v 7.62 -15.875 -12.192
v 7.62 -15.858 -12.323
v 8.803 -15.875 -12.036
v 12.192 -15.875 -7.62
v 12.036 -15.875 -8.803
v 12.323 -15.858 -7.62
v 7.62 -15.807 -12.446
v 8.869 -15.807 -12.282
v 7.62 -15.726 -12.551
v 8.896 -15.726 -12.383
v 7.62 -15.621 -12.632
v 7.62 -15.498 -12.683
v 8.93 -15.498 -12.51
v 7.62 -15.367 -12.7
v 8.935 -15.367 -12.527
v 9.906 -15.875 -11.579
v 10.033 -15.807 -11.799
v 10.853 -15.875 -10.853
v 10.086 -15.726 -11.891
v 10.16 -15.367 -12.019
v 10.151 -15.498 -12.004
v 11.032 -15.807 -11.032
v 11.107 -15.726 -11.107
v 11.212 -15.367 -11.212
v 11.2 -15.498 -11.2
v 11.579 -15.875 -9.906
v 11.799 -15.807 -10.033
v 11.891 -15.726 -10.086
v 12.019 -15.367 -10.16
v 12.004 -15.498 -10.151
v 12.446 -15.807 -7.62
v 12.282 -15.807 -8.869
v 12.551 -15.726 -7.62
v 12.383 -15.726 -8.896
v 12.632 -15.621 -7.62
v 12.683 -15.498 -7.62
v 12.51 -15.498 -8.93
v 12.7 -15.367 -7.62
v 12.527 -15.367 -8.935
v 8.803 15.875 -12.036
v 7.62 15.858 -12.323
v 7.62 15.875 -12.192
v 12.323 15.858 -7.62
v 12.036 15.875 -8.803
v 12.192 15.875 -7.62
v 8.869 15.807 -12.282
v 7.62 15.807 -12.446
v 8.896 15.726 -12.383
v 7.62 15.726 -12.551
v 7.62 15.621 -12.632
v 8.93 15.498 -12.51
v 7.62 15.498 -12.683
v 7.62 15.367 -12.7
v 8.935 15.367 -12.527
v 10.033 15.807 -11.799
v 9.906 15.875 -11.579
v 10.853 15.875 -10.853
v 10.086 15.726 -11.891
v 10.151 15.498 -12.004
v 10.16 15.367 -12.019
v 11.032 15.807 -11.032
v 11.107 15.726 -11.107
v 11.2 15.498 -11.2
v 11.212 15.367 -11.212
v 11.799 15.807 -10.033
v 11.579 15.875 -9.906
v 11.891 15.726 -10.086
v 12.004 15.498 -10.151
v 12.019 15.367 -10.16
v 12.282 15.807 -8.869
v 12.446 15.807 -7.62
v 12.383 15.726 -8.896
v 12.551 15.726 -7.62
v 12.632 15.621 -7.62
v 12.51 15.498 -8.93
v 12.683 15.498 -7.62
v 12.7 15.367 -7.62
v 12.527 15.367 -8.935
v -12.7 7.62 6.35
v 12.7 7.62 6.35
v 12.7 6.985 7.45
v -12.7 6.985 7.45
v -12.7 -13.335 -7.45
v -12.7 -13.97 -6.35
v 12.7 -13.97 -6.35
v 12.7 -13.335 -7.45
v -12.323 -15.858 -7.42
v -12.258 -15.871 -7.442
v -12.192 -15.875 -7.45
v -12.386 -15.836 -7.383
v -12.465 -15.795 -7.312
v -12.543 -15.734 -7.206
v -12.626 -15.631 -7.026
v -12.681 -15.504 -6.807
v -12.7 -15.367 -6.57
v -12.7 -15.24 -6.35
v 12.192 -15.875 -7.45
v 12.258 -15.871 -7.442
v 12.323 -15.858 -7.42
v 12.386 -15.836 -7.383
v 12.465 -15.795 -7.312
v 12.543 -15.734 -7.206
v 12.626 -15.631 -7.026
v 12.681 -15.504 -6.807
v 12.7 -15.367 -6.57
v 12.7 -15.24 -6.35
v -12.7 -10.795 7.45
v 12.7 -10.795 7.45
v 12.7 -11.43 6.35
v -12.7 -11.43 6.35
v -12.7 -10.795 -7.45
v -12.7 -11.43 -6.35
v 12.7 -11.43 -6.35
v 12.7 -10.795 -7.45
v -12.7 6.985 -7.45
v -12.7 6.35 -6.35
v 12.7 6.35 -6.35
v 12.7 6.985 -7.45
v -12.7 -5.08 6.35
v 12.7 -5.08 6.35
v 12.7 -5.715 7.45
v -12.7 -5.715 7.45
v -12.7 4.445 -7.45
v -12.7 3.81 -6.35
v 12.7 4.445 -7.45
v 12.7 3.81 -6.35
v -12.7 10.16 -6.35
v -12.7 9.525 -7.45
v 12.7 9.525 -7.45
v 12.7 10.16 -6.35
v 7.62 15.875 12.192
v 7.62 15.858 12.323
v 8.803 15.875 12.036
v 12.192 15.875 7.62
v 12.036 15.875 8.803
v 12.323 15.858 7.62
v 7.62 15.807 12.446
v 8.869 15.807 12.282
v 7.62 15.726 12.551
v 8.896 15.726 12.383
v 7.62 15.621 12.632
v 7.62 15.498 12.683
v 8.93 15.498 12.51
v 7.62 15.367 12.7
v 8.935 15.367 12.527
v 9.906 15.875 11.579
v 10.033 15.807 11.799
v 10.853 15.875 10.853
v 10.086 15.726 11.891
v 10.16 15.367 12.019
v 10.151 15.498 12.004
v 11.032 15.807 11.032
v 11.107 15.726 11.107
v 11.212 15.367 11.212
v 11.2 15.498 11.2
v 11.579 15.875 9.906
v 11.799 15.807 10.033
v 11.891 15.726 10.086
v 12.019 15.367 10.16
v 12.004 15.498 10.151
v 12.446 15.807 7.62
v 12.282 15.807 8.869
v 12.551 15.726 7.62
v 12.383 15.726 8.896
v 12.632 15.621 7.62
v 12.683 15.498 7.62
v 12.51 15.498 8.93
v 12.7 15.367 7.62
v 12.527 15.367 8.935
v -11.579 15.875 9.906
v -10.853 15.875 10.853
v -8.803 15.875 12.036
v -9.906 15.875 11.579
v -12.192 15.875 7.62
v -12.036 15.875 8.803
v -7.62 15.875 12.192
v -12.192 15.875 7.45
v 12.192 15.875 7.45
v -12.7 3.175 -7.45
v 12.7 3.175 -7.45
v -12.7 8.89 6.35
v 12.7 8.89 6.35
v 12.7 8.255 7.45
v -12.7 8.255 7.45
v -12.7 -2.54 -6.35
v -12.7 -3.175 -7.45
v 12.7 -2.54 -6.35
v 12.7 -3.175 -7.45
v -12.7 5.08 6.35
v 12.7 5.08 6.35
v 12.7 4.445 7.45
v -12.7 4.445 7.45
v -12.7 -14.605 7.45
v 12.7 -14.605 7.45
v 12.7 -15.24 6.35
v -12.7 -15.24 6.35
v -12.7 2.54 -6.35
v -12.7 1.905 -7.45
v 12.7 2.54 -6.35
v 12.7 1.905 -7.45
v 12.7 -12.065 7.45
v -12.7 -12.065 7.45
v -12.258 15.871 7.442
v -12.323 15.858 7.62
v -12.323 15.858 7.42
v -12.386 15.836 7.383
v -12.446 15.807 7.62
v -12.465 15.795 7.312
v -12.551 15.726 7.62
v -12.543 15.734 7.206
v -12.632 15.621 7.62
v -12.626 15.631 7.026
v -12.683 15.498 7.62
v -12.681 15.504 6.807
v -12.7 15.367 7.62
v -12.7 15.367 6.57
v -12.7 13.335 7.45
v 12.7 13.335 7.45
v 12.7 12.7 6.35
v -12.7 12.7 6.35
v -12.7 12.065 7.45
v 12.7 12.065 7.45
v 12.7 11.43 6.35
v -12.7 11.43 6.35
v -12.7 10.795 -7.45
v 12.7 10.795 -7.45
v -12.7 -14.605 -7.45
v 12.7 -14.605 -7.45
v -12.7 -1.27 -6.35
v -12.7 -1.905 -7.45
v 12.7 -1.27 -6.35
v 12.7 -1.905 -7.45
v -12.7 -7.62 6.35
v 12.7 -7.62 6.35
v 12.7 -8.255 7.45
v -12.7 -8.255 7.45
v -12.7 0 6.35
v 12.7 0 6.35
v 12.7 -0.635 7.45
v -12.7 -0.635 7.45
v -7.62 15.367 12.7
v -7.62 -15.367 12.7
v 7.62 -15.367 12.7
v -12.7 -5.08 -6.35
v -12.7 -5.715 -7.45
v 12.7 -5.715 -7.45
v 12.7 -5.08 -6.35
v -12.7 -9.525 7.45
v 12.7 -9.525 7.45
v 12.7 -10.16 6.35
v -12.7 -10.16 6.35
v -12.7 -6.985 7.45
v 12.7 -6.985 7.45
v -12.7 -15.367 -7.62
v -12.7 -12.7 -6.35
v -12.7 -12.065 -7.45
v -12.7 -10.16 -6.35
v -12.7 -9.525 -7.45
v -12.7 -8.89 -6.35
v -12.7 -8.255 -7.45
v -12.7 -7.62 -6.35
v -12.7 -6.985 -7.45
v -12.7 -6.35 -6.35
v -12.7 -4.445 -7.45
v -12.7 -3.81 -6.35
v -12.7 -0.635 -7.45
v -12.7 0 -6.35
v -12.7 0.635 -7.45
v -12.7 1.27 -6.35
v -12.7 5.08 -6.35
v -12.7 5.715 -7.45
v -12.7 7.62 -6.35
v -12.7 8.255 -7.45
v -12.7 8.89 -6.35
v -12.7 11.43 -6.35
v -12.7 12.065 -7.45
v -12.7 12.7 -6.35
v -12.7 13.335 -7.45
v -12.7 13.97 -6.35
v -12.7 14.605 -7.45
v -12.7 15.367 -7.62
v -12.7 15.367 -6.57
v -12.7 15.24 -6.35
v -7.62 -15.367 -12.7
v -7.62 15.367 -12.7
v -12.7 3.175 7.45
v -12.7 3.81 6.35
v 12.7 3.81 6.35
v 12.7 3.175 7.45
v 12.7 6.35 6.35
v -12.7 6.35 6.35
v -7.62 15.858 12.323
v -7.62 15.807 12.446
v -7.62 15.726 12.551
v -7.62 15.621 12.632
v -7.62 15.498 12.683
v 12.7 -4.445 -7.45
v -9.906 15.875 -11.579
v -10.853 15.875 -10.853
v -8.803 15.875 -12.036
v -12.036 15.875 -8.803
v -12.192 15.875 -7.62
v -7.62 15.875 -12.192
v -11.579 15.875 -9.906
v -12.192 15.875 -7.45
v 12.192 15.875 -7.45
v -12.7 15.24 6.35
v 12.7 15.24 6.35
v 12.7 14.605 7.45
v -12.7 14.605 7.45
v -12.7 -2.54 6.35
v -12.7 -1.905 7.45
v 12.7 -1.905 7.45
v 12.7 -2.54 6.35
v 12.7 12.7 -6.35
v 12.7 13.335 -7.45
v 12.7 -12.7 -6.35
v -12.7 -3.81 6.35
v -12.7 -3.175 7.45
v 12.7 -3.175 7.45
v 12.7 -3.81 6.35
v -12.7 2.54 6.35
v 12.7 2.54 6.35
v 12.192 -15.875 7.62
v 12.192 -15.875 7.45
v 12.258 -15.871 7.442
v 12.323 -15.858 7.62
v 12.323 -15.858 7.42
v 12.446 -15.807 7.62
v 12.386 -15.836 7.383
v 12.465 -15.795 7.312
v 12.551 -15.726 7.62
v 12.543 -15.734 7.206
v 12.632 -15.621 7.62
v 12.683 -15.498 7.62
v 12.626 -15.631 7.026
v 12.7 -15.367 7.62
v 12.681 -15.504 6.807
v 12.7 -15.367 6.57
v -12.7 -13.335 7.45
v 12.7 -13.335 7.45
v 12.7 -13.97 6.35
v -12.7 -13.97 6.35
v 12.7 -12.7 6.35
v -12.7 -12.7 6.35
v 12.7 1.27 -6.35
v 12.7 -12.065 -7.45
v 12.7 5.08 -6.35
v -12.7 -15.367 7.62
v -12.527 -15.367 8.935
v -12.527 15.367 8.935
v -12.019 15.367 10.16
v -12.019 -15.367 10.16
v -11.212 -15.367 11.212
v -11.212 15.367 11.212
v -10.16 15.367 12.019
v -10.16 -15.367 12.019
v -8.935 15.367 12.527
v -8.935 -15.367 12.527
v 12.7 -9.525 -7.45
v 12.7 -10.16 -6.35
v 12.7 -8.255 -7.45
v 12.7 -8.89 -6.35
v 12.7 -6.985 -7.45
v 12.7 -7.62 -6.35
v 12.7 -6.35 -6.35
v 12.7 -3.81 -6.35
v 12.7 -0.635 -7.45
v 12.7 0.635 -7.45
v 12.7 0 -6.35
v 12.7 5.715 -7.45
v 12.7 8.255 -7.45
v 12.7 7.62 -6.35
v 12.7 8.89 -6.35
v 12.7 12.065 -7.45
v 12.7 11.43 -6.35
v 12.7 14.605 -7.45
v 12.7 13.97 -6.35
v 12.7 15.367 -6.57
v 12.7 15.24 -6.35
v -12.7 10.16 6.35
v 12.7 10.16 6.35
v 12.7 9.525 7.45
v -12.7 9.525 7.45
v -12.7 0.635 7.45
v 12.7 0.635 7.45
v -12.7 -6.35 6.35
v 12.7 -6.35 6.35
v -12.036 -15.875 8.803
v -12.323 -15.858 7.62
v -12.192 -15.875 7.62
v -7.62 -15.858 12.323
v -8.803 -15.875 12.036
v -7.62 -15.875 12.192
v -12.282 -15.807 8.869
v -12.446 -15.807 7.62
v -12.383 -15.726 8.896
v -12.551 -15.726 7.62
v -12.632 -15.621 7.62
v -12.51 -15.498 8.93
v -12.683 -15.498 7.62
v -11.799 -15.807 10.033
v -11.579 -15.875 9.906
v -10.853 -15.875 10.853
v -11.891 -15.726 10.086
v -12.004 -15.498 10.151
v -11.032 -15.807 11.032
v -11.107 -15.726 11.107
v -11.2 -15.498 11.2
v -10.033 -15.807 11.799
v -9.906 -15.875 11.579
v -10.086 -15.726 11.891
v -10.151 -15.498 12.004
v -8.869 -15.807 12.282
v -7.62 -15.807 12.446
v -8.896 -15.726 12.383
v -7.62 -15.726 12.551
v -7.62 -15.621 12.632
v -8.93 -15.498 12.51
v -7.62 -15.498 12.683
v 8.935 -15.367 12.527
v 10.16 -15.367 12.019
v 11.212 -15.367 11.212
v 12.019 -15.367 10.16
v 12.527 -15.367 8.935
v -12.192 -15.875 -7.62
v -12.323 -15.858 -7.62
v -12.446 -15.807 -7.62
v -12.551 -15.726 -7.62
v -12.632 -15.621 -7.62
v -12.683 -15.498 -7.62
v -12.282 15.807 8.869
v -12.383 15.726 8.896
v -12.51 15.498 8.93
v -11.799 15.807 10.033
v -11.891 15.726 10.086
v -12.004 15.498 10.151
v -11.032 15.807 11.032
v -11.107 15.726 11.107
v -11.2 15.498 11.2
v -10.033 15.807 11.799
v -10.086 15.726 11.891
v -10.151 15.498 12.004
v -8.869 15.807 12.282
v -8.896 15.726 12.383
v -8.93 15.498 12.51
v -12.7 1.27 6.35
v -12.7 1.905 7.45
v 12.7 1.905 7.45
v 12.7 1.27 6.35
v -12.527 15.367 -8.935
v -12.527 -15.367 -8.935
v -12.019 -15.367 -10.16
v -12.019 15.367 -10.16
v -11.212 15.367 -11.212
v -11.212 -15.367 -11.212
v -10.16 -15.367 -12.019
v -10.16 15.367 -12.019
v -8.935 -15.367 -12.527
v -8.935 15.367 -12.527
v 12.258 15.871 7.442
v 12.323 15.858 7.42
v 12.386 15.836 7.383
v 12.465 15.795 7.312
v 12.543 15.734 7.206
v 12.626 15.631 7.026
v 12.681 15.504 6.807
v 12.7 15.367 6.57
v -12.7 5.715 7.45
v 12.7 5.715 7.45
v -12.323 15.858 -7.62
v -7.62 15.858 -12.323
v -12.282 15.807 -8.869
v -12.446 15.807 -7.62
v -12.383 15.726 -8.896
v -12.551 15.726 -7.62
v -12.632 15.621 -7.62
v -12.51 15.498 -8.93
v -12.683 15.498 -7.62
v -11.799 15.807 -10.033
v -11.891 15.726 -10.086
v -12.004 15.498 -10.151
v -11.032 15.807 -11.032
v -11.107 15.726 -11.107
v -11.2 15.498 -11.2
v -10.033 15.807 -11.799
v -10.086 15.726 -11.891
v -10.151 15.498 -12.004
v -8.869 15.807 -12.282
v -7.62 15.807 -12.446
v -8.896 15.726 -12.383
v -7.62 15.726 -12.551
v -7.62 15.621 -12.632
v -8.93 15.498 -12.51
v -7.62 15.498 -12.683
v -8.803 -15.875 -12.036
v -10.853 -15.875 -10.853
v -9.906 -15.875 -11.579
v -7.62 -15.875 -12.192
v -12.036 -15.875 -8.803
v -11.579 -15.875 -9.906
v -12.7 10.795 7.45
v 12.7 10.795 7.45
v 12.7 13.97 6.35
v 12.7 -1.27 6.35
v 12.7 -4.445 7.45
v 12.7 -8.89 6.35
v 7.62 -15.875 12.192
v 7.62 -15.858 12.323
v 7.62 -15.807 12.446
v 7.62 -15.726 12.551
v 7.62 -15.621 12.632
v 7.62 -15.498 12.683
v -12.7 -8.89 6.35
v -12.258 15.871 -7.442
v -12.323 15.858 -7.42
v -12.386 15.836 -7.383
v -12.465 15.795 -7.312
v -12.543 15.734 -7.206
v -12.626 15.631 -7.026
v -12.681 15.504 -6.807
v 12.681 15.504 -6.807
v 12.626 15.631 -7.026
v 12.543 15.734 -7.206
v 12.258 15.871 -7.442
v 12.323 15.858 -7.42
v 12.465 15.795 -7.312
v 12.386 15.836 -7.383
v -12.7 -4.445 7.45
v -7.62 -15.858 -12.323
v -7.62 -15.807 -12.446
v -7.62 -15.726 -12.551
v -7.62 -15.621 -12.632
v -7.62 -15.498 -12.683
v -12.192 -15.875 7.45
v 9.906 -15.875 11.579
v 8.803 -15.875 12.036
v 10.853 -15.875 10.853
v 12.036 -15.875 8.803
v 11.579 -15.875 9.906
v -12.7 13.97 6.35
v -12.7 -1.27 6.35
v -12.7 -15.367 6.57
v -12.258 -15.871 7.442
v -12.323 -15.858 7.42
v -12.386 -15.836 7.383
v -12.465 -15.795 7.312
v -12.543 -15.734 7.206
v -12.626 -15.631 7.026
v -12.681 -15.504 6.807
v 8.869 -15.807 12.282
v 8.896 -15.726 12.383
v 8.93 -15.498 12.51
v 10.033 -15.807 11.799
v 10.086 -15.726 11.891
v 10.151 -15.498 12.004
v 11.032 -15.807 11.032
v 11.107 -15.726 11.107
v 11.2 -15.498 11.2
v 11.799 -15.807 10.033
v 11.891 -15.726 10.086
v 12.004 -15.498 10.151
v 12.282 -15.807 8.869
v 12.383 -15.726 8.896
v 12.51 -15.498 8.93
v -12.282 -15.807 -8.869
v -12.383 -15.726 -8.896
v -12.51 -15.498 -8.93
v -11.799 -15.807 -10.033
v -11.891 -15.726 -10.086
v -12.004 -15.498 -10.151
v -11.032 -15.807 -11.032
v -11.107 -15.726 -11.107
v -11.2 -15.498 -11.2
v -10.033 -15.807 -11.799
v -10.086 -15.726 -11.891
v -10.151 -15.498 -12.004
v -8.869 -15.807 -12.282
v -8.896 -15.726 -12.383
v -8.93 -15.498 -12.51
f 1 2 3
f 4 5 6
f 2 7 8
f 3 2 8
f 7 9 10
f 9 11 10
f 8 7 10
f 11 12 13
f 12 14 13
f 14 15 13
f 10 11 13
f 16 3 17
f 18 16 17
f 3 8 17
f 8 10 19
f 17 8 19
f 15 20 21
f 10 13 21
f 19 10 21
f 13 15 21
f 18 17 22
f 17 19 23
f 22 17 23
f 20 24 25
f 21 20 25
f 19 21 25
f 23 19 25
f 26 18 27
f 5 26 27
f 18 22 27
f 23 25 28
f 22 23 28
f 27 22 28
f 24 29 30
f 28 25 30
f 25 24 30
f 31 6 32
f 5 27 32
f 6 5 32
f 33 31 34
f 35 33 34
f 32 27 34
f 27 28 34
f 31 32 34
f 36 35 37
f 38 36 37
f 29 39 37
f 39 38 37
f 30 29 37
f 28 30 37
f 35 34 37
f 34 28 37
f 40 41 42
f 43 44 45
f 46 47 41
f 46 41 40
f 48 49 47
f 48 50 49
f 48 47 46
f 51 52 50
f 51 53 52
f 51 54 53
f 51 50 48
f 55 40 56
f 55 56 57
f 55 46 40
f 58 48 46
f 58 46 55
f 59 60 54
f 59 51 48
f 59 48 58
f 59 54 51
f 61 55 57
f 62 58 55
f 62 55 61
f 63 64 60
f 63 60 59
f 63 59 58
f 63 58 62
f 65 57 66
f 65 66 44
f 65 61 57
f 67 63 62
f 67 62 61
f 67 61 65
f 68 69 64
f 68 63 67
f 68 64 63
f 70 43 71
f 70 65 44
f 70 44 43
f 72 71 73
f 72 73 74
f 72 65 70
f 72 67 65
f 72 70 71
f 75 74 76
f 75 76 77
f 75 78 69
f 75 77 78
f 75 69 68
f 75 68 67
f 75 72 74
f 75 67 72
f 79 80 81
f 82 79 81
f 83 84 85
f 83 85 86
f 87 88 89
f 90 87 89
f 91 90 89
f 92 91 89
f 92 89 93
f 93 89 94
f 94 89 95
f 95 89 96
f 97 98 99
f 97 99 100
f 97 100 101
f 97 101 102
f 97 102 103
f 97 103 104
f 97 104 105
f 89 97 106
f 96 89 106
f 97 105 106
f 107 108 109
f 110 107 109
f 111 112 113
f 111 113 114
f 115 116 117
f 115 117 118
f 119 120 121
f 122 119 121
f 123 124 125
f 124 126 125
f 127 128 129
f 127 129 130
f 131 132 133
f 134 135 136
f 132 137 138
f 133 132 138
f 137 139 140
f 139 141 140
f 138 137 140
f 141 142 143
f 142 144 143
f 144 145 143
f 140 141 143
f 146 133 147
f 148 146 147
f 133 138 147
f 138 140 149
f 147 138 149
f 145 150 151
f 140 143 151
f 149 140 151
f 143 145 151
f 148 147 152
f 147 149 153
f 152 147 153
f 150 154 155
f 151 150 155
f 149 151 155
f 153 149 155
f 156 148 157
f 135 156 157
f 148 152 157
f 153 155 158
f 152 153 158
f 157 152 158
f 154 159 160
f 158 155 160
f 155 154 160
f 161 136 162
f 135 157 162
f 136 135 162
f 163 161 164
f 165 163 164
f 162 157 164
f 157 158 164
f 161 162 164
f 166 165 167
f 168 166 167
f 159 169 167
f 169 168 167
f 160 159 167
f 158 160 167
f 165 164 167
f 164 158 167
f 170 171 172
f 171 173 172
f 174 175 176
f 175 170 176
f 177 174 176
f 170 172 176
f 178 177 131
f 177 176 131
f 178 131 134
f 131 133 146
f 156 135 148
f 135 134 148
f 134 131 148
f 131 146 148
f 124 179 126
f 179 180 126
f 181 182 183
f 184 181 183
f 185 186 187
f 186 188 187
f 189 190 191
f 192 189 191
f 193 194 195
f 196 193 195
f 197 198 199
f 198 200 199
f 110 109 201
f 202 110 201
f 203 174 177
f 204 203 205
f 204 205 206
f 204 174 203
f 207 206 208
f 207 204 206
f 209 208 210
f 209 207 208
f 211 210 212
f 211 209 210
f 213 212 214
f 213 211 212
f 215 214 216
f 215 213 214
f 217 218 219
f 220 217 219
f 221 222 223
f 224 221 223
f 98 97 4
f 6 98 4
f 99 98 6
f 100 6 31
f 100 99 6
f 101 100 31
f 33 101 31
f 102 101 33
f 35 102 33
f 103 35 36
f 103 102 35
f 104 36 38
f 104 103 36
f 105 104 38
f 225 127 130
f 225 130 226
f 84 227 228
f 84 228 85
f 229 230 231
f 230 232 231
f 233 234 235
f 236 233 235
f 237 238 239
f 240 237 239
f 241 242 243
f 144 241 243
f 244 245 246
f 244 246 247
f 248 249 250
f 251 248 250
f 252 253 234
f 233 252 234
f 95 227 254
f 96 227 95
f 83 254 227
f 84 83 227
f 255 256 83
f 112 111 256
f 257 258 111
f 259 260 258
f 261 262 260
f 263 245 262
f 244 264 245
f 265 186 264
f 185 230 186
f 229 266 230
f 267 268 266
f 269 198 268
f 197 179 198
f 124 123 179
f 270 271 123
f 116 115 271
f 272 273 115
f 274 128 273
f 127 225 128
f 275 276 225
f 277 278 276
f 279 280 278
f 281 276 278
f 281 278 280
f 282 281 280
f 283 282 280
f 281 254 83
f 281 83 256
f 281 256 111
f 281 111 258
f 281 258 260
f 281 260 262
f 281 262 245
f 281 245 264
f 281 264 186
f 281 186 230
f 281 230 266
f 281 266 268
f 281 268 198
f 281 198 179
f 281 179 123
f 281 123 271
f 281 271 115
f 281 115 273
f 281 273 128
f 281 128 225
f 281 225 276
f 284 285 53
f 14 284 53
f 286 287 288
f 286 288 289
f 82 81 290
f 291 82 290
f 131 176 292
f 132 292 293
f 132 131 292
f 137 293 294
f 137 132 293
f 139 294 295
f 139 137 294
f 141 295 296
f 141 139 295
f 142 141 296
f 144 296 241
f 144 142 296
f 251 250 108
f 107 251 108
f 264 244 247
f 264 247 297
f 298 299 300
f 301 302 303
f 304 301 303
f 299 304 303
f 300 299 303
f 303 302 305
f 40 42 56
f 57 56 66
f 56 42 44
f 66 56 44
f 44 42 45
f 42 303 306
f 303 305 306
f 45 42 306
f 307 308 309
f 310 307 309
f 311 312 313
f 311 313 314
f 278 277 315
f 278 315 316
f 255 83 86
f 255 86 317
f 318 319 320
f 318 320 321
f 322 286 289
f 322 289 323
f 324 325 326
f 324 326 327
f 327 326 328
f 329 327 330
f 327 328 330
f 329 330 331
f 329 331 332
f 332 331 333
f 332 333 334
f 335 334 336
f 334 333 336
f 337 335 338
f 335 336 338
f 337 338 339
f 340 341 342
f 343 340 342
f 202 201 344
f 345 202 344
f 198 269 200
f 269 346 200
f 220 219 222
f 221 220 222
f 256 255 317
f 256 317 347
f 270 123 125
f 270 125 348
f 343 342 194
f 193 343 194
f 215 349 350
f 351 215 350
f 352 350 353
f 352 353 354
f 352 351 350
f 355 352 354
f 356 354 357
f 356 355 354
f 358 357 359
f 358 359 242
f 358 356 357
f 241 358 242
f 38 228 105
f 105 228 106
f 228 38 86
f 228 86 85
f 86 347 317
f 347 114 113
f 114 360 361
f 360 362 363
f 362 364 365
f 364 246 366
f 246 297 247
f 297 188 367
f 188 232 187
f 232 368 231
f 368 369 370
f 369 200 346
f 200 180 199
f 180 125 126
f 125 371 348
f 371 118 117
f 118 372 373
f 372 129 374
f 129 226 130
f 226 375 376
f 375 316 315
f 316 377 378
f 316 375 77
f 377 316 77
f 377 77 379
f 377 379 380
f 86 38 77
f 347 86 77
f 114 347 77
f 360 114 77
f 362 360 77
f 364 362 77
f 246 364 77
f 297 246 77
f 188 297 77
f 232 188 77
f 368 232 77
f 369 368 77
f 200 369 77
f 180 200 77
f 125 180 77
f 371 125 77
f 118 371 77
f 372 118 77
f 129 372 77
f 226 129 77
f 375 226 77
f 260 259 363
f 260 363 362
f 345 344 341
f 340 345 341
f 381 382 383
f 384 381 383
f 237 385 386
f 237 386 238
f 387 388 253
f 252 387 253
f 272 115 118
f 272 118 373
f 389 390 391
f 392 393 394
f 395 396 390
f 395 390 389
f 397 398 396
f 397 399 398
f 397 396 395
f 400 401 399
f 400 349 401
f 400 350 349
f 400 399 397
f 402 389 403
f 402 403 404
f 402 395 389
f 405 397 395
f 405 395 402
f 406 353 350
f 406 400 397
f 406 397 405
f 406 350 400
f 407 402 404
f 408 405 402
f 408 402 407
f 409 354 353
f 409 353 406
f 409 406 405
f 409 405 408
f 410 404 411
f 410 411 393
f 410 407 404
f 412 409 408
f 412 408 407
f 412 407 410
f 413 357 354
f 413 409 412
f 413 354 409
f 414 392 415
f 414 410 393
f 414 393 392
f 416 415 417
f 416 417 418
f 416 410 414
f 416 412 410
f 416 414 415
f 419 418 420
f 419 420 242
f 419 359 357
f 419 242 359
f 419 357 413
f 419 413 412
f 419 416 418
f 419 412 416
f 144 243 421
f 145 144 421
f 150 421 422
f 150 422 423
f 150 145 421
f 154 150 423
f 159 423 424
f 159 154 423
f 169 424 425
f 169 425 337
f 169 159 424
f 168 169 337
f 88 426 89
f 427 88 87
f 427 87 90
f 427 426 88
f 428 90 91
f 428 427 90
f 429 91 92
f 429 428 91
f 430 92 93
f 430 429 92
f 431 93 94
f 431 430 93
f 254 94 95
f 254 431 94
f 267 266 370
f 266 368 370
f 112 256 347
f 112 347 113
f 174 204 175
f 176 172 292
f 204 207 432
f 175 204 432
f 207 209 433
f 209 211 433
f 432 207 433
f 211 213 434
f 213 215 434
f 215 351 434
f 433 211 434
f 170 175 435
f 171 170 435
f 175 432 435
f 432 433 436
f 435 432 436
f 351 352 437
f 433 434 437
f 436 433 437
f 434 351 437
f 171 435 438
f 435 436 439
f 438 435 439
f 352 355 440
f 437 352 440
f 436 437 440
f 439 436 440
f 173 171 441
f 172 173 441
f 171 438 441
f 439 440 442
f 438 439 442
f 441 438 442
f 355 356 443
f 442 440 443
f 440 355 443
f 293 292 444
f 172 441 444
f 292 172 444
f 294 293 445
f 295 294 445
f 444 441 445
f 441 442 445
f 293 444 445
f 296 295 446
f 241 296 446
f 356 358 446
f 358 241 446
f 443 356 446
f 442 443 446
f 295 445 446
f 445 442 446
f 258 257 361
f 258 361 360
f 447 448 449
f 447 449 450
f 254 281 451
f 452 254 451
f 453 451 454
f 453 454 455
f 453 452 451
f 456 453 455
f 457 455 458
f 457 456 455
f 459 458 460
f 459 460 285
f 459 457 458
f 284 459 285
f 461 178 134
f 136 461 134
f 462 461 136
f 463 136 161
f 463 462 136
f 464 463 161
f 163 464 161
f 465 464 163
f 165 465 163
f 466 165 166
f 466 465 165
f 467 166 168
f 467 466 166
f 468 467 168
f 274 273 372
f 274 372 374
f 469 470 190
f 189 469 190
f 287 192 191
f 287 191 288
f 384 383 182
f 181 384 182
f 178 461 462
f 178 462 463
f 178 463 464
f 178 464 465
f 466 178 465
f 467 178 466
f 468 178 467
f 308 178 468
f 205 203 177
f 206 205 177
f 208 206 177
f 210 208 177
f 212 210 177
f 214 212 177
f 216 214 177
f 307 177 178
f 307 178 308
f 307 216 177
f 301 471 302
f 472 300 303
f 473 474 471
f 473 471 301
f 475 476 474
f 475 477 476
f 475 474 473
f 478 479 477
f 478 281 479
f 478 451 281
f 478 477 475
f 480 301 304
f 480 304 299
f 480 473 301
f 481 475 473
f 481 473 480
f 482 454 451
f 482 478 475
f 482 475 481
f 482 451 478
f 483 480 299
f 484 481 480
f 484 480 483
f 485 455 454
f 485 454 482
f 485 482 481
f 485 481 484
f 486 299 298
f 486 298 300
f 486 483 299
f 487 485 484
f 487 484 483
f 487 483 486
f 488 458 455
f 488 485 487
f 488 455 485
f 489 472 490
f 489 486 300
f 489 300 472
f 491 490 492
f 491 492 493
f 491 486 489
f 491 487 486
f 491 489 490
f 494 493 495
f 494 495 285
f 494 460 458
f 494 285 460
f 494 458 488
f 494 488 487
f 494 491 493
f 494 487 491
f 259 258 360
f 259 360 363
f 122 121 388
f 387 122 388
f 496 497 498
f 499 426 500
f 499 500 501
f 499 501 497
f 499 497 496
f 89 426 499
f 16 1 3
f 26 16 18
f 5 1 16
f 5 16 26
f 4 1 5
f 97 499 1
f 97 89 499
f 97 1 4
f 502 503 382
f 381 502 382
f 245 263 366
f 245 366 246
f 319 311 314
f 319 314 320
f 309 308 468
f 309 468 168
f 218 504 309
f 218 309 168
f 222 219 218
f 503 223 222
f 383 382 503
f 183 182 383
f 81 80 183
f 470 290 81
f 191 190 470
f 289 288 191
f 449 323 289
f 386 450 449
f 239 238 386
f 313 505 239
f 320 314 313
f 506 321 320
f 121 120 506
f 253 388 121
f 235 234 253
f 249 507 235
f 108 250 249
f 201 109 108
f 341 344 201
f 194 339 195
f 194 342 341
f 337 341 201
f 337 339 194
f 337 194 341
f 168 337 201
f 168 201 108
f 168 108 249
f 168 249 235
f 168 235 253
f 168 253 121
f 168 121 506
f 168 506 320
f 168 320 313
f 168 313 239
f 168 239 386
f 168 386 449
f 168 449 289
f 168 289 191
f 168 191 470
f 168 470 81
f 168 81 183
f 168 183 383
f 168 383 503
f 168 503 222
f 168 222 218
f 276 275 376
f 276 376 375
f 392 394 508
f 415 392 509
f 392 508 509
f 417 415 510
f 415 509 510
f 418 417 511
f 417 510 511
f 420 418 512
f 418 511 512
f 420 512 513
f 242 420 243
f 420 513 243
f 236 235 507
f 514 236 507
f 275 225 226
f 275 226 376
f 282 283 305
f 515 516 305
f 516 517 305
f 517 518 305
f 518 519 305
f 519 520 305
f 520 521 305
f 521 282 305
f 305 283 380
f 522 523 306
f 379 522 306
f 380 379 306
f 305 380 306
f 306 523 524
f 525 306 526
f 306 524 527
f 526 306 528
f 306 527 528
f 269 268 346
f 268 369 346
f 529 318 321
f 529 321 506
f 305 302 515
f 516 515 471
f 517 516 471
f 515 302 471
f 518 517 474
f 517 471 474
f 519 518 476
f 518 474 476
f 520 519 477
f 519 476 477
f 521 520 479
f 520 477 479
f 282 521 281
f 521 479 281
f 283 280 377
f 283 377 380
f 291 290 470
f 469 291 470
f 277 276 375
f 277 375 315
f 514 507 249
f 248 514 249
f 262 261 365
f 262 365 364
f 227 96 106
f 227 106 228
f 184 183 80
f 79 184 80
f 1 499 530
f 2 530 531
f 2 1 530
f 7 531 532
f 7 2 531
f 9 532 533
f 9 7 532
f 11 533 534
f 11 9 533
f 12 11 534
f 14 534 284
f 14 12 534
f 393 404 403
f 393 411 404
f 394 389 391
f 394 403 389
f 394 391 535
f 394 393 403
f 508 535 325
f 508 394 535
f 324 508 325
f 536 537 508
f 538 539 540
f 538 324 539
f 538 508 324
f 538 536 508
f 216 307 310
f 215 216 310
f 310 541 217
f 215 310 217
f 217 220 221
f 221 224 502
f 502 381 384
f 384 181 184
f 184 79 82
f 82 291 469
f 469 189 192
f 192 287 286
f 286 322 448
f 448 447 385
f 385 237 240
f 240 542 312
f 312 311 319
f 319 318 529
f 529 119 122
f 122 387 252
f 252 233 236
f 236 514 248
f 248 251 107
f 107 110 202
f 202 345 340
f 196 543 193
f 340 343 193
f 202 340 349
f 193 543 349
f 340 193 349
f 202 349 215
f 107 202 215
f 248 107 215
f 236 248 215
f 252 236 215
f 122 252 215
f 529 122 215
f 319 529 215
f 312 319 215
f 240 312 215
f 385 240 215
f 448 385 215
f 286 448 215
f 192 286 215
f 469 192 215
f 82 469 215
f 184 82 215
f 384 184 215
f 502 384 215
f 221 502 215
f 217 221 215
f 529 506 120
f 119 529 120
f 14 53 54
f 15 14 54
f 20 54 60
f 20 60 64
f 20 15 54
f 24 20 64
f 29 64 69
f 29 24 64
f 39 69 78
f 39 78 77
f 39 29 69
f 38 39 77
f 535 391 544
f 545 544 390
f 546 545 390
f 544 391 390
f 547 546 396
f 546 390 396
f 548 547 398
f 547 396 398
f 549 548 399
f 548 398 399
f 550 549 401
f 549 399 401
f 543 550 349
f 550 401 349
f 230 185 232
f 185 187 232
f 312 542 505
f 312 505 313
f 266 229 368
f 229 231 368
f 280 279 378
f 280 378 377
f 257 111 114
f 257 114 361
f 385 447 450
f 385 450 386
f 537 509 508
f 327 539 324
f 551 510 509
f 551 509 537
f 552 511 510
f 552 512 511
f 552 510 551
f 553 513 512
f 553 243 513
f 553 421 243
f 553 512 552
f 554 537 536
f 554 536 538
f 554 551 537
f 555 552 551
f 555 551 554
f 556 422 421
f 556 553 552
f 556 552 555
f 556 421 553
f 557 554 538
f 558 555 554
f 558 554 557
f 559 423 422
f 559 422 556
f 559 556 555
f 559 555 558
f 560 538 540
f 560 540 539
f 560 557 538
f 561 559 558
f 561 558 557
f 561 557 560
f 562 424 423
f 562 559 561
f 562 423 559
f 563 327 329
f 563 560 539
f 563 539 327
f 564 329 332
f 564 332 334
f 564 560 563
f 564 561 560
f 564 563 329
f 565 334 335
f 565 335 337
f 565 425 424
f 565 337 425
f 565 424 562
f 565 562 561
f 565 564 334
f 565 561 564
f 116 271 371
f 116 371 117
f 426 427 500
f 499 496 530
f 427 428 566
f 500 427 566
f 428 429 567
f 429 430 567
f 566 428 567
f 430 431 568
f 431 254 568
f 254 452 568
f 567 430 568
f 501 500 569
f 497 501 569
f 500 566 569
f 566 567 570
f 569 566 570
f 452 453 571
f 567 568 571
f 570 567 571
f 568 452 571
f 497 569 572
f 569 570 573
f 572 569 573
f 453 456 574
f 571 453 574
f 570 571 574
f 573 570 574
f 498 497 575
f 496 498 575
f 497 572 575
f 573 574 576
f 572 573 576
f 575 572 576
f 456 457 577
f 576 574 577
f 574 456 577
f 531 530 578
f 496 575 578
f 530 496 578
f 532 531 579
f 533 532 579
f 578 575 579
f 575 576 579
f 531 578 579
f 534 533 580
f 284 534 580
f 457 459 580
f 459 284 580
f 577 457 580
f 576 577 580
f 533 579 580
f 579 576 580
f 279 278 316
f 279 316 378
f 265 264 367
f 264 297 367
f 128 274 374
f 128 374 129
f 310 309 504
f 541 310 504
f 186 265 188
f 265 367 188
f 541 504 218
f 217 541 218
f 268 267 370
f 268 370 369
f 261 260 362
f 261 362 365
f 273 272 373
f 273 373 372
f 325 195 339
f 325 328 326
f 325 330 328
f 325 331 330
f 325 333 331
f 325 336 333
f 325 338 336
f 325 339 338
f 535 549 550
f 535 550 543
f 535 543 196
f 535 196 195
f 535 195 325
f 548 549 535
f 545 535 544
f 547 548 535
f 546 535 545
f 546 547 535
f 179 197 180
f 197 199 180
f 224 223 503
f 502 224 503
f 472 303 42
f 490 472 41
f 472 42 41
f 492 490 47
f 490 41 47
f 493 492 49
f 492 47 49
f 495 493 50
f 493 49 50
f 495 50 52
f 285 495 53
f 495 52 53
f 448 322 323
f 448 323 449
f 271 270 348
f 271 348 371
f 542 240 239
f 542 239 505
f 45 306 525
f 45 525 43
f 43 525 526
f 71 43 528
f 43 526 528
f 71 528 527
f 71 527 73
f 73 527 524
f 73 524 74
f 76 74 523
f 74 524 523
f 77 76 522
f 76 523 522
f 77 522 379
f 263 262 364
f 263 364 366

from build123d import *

# Parameters (mm, degrees)
F0_W     = 25.4
F0_H     = 6.35
F1_DEPTH = 15.875
F3_DEPTH = 12.7
F4_R     = 5.08
F5_R     = 0.508


with BuildPart() as f1:
    # F0 (on Front) → F1 (new body, symmetric)
    with BuildSketch(Plane.XZ):
        with Locations((0, -9.525)):
            Rectangle(F0_W, F0_H)
        with Locations((0, 9.525)):
            Rectangle(F0_W, F0_H)
    extrude(amount=F1_DEPTH, both=True)

    # F2 (on Right) → F3 (cut, symmetric)
    with BuildSketch(Plane.YZ):
        Polygon((-1.27, 6.35), (0, 6.35), (-0.635, 7.449852), align=None)
        Polygon((29.845, 7.449852), (29.21, 6.35), (30.48, 6.35), align=None)
        Polygon((28.575, 7.449852), (27.94, 6.35), (29.21, 6.35), align=None)
        Polygon((27.305, 7.449852), (26.67, 6.35), (27.94, 6.35), align=None)
        Polygon((26.035, 7.449852), (25.4, 6.35), (26.67, 6.35), align=None)
        Polygon((24.765, 7.449852), (24.13, 6.35), (25.4, 6.35), align=None)
        Polygon((23.495, 7.449852), (22.86, 6.35), (24.13, 6.35), align=None)
        Polygon((22.225, 7.449852), (21.59, 6.35), (22.86, 6.35), align=None)
        Polygon((20.955, 7.449852), (20.32, 6.35), (21.59, 6.35), align=None)
        Polygon((19.685, 7.449852), (19.05, 6.35), (20.32, 6.35), align=None)
        Polygon((18.415, 7.449852), (17.78, 6.35), (19.05, 6.35), align=None)
        Polygon((17.145, 7.449852), (16.51, 6.35), (17.78, 6.35), align=None)
        Polygon((15.875, 7.449852), (15.24, 6.35), (16.51, 6.35), align=None)
        Polygon((14.605, 7.449852), (13.97, 6.35), (15.24, 6.35), align=None)
        Polygon((13.335, 7.449852), (12.7, 6.35), (13.97, 6.35), align=None)
        Polygon((12.065, 7.449852), (11.43, 6.35), (12.7, 6.35), align=None)
        Polygon((10.795, 7.449852), (10.16, 6.35), (11.43, 6.35), align=None)
        Polygon((9.525, 7.449852), (8.89, 6.35), (10.16, 6.35), align=None)
        Polygon((8.255, 7.449852), (7.62, 6.35), (8.89, 6.35), align=None)
        Polygon((6.985, 7.449852), (6.35, 6.35), (7.62, 6.35), align=None)
        Polygon((5.715, 7.449852), (5.08, 6.35), (6.35, 6.35), align=None)
        Polygon((4.445, 7.449852), (3.81, 6.35), (5.08, 6.35), align=None)
        Polygon((3.175, 7.449852), (2.54, 6.35), (3.81, 6.35), align=None)
        Polygon((1.905, 7.449852), (1.27, 6.35), (2.54, 6.35), align=None)
        Polygon((-30.48, 6.35), (-29.21, 6.35), (-29.845, 7.449852), align=None)
        Polygon((-29.21, 6.35), (-27.94, 6.35), (-28.575, 7.449852), align=None)
        Polygon((-27.94, 6.35), (-26.67, 6.35), (-27.305, 7.449852), align=None)
        Polygon((-26.67, 6.35), (-25.4, 6.35), (-26.035, 7.449852), align=None)
        Polygon((-25.4, 6.35), (-24.13, 6.35), (-24.765, 7.449852), align=None)
        Polygon((-24.13, 6.35), (-22.86, 6.35), (-23.495, 7.449852), align=None)
        Polygon((-22.86, 6.35), (-21.59, 6.35), (-22.225, 7.449852), align=None)
        Polygon((-21.59, 6.35), (-20.32, 6.35), (-20.955, 7.449852), align=None)
        Polygon((-20.32, 6.35), (-19.05, 6.35), (-19.685, 7.449852), align=None)
        Polygon((-19.05, 6.35), (-17.78, 6.35), (-18.415, 7.449852), align=None)
        Polygon((-17.78, 6.35), (-16.51, 6.35), (-17.145, 7.449852), align=None)
        Polygon((-16.51, 6.35), (-15.24, 6.35), (-15.875, 7.449852), align=None)
        Polygon((-15.24, 6.35), (-13.97, 6.35), (-14.605, 7.449852), align=None)
        Polygon((-13.97, 6.35), (-12.7, 6.35), (-13.335, 7.449852), align=None)
        Polygon((-12.7, 6.35), (-11.43, 6.35), (-12.065, 7.449852), align=None)
        Polygon((-11.43, 6.35), (-10.16, 6.35), (-10.795, 7.449852), align=None)
        Polygon((-10.16, 6.35), (-8.89, 6.35), (-9.525, 7.449852), align=None)
        Polygon((-8.89, 6.35), (-7.62, 6.35), (-8.255, 7.449852), align=None)
        Polygon((-7.62, 6.35), (-6.35, 6.35), (-6.985, 7.449852), align=None)
        Polygon((-6.35, 6.35), (-5.08, 6.35), (-5.715, 7.449852), align=None)
        Polygon((-5.08, 6.35), (-3.81, 6.35), (-4.445, 7.449852), align=None)
        Polygon((-3.81, 6.35), (-2.54, 6.35), (-3.175, 7.449852), align=None)
        Polygon((-2.54, 6.35), (-1.27, 6.35), (-1.905, 7.449852), align=None)
        Polygon((0.635, 7.449852), (0, 6.35), (1.27, 6.35), align=None)
        Polygon((-65.024, -6.35), (-64.877353, -6.35), (-65.024, -6.096), align=None)
        Polygon((-64.516, -6.975882), (-64.154647, -6.35), (-64.877353, -6.35), align=None)
        Polygon((-63.5, -7.229882), (-62.992, -6.35), (-64.008, -6.35), align=None)
        Polygon((-62.484, -7.229882), (-61.976, -6.35), (-62.992, -6.35), align=None)
        Polygon((-61.468, -7.229882), (-60.96, -6.35), (-61.976, -6.35), align=None)
        Polygon((-60.452, -7.229882), (-59.944, -6.35), (-60.96, -6.35), align=None)
        Polygon((-59.436, -7.229882), (-58.928, -6.35), (-59.944, -6.35), align=None)
        Polygon((-58.42, -7.229882), (-57.912, -6.35), (-58.928, -6.35), align=None)
        Polygon((-57.404, -7.229882), (-56.896, -6.35), (-57.912, -6.35), align=None)
        Polygon((-56.388, -7.229882), (-55.88, -6.35), (-56.896, -6.35), align=None)
        Polygon((-55.372, -7.229882), (-54.864, -6.35), (-55.88, -6.35), align=None)
        Polygon((-54.356, -7.229882), (-53.848, -6.35), (-54.864, -6.35), align=None)
        Polygon((-53.34, -7.229882), (-52.832, -6.35), (-53.848, -6.35), align=None)
        Polygon((-52.324, -7.229882), (-51.816, -6.35), (-52.832, -6.35), align=None)
        Polygon((-51.308, -7.229882), (-50.8, -6.35), (-51.816, -6.35), align=None)
        Polygon((-50.292, -7.229882), (-49.784, -6.35), (-50.8, -6.35), align=None)
        Polygon((-49.276, -7.229882), (-48.768, -6.35), (-49.784, -6.35), align=None)
        Polygon((-48.26, -7.229882), (-47.752, -6.35), (-48.768, -6.35), align=None)
        Polygon((-47.244, -7.229882), (-46.736, -6.35), (-47.752, -6.35), align=None)
        Polygon((-46.228, -7.229882), (-45.72, -6.35), (-46.736, -6.35), align=None)
        Polygon((-45.212, -7.229882), (-44.704, -6.35), (-45.72, -6.35), align=None)
        Polygon((-44.196, -7.229882), (-43.688, -6.35), (-44.704, -6.35), align=None)
        Polygon((-43.18, -7.229882), (-42.672, -6.35), (-43.688, -6.35), align=None)
        Polygon((-42.164, -7.229882), (-41.656, -6.35), (-42.672, -6.35), align=None)
        Polygon((-41.148, -7.229882), (-40.64, -6.35), (-41.656, -6.35), align=None)
        Polygon((-40.132, -7.229882), (-39.624, -6.35), (-40.64, -6.35), align=None)
        Polygon((-39.116, -7.229882), (-38.608, -6.35), (-39.624, -6.35), align=None)
        Polygon((-38.1, -7.229882), (-37.592, -6.35), (-38.608, -6.35), align=None)
        Polygon((-36.068, -7.229882), (-35.56, -6.35), (-36.576, -6.35), align=None)
        Polygon((-30.988, -7.229882), (-30.48, -6.35), (-31.496, -6.35), align=None)
        Polygon((-29.845, -7.449852), (-29.21, -6.35), (-29.464, -6.35), (-29.972, -7.229882), align=None)
        Polygon((-28.575, -7.449852), (-27.94, -6.35), (-29.21, -6.35), align=None)
        Polygon((-27.305, -7.449852), (-26.67, -6.35), (-27.94, -6.35), align=None)
        Polygon((-26.035, -7.449852), (-25.4, -6.35), (-26.67, -6.35), align=None)
        Polygon((-24.765, -7.449852), (-24.13, -6.35), (-25.4, -6.35), align=None)
        Polygon((-23.495, -7.449852), (-22.86, -6.35), (-24.13, -6.35), align=None)
        Polygon((-22.225, -7.449852), (-21.59, -6.35), (-22.86, -6.35), align=None)
        Polygon((-20.955, -7.449852), (-20.32, -6.35), (-21.59, -6.35), align=None)
        Polygon((-19.685, -7.449852), (-19.05, -6.35), (-20.32, -6.35), align=None)
        Polygon((-18.415, -7.449852), (-17.78, -6.35), (-19.05, -6.35), align=None)
        Polygon((-17.145, -7.449852), (-16.51, -6.35), (-17.78, -6.35), align=None)
        Polygon((-15.875, -7.449852), (-15.24, -6.35), (-16.51, -6.35), align=None)
        Polygon((-14.605, -7.449852), (-13.97, -6.35), (-15.24, -6.35), align=None)
        Polygon((-13.335, -7.449852), (-12.7, -6.35), (-13.97, -6.35), align=None)
        Polygon((-12.065, -7.449852), (-11.43, -6.35), (-12.7, -6.35), align=None)
        Polygon((-10.795, -7.449852), (-10.16, -6.35), (-11.43, -6.35), align=None)
        Polygon((-9.525, -7.449852), (-8.89, -6.35), (-10.16, -6.35), align=None)
        Polygon((-8.255, -7.449852), (-7.62, -6.35), (-8.89, -6.35), align=None)
        Polygon((-6.985, -7.449852), (-6.35, -6.35), (-7.62, -6.35), align=None)
        Polygon((-5.715, -7.449852), (-5.08, -6.35), (-6.35, -6.35), align=None)
        Polygon((-4.445, -7.449852), (-3.81, -6.35), (-5.08, -6.35), align=None)
        Polygon((-3.175, -7.449852), (-2.54, -6.35), (-3.81, -6.35), align=None)
        Polygon((-1.905, -7.449852), (-1.27, -6.35), (-2.54, -6.35), align=None)
        Polygon((-0.635, -7.449852), (0, -6.35), (-1.27, -6.35), align=None)
        Polygon((0.635, -7.449852), (1.27, -6.35), (0, -6.35), align=None)
        Polygon((1.905, -7.449852), (2.54, -6.35), (1.27, -6.35), align=None)
        Polygon((3.175, -7.449852), (3.81, -6.35), (2.54, -6.35), align=None)
        Polygon((4.445, -7.449852), (5.08, -6.35), (3.81, -6.35), align=None)
        Polygon((5.715, -7.449852), (6.35, -6.35), (5.08, -6.35), align=None)
        Polygon((6.985, -7.449852), (7.62, -6.35), (6.35, -6.35), align=None)
        Polygon((8.255, -7.449852), (8.89, -6.35), (7.62, -6.35), align=None)
        Polygon((9.525, -7.449852), (10.16, -6.35), (8.89, -6.35), align=None)
        Polygon((10.795, -7.449852), (11.43, -6.35), (10.16, -6.35), align=None)
        Polygon((12.065, -7.449852), (12.7, -6.35), (11.43, -6.35), align=None)
        Polygon((13.335, -7.449852), (13.97, -6.35), (12.7, -6.35), align=None)
        Polygon((14.605, -7.449852), (15.24, -6.35), (13.97, -6.35), align=None)
        Polygon((15.875, -7.449852), (16.51, -6.35), (15.24, -6.35), align=None)
        Polygon((17.145, -7.449852), (17.78, -6.35), (16.51, -6.35), align=None)
        Polygon((18.415, -7.449852), (19.05, -6.35), (17.78, -6.35), align=None)
        Polygon((19.685, -7.449852), (20.32, -6.35), (19.05, -6.35), align=None)
        Polygon((20.955, -7.449852), (21.59, -6.35), (20.32, -6.35), align=None)
        Polygon((22.225, -7.449852), (22.86, -6.35), (21.59, -6.35), align=None)
        Polygon((23.495, -7.449852), (24.13, -6.35), (22.86, -6.35), align=None)
        Polygon((24.765, -7.449852), (25.4, -6.35), (24.13, -6.35), align=None)
        Polygon((26.035, -7.449852), (26.67, -6.35), (25.4, -6.35), align=None)
        Polygon((27.305, -7.449852), (27.94, -6.35), (26.67, -6.35), align=None)
        Polygon((28.575, -7.449852), (29.21, -6.35), (27.94, -6.35), align=None)
        Polygon((29.972, -7.229882), (30.48, -6.35), (29.464, -6.35), align=None)
        Polygon((35.052, -7.229882), (35.56, -6.35), (34.544, -6.35), align=None)
        Polygon((37.084, -7.229882), (37.592, -6.35), (36.83, -6.35), (36.703, -6.56997), align=None)
        Polygon((38.1, -7.229882), (38.608, -6.35), (37.592, -6.35), align=None)
        Polygon((64.008, -6.35), (62.992, -6.35), (63.5, -7.229882), align=None)
        Polygon((62.992, -6.35), (61.976, -6.35), (62.484, -7.229882), align=None)
        Polygon((61.976, -6.35), (60.96, -6.35), (61.468, -7.229882), align=None)
        Polygon((60.96, -6.35), (59.944, -6.35), (60.452, -7.229882), align=None)
        Polygon((59.944, -6.35), (58.928, -6.35), (59.436, -7.229882), align=None)
        Polygon((58.928, -6.35), (57.912, -6.35), (58.42, -7.229882), align=None)
        Polygon((57.912, -6.35), (56.896, -6.35), (57.404, -7.229882), align=None)
        Polygon((56.896, -6.35), (55.88, -6.35), (56.388, -7.229882), align=None)
        Polygon((55.88, -6.35), (54.864, -6.35), (55.372, -7.229882), align=None)
        Polygon((54.864, -6.35), (53.848, -6.35), (54.356, -7.229882), align=None)
        Polygon((53.848, -6.35), (52.832, -6.35), (53.34, -7.229882), align=None)
        Polygon((52.832, -6.35), (51.816, -6.35), (52.324, -7.229882), align=None)
        Polygon((51.816, -6.35), (50.8, -6.35), (51.308, -7.229882), align=None)
        Polygon((50.8, -6.35), (49.784, -6.35), (50.292, -7.229882), align=None)
        Polygon((49.784, -6.35), (48.768, -6.35), (49.276, -7.229882), align=None)
        Polygon((48.768, -6.35), (47.752, -6.35), (48.26, -7.229882), align=None)
        Polygon((47.752, -6.35), (46.736, -6.35), (47.244, -7.229882), align=None)
        Polygon((46.736, -6.35), (45.72, -6.35), (46.228, -7.229882), align=None)
        Polygon((45.72, -6.35), (44.704, -6.35), (45.212, -7.229882), align=None)
        Polygon((44.704, -6.35), (43.688, -6.35), (44.196, -7.229882), align=None)
        Polygon((43.688, -6.35), (42.672, -6.35), (43.18, -7.229882), align=None)
        Polygon((42.672, -6.35), (41.656, -6.35), (42.164, -7.229882), align=None)
        Polygon((41.656, -6.35), (40.64, -6.35), (41.148, -7.229882), align=None)
        Polygon((40.64, -6.35), (39.624, -6.35), (40.132, -7.229882), align=None)
        Polygon((38.608, -6.35), (39.116, -7.229882), (39.624, -6.35), align=None)
        Polygon((36.703, -6.56997), (36.83, -6.35), (36.576, -6.35), align=None)
        Polygon((36.195, -7.449852), (36.703, -6.56997), (36.576, -6.35), (36.068, -7.229882), align=None)
        Polygon((36.068, -7.229882), (36.576, -6.35), (35.56, -6.35), align=None)
        Polygon((34.925, -7.449852), (35.052, -7.229882), (34.544, -6.35), (34.417, -6.56997), align=None)
        Polygon((34.417, -6.56997), (34.544, -6.35), (34.29, -6.35), align=None)
        Polygon((34.036, -7.229882), (34.417, -6.56997), (34.29, -6.35), (33.909, -7.009911), align=None)
        Polygon((33.909, -7.009911), (34.29, -6.35), (33.528, -6.35), align=None)
        Polygon((33.655, -7.449852), (33.909, -7.009911), (33.528, -6.35), (33.274, -6.789941), align=None)
        Polygon((33.274, -6.789941), (33.528, -6.35), (33.02, -6.35), align=None)
        Polygon((33.02, -7.229882), (33.274, -6.789941), (33.02, -6.35), (32.766, -6.789941), align=None)
        Polygon((32.766, -6.789941), (33.02, -6.35), (32.512, -6.35), align=None)
        Polygon((32.385, -7.449852), (32.766, -6.789941), (32.512, -6.35), (32.131, -7.009911), align=None)
        Polygon((32.131, -7.009911), (32.512, -6.35), (31.75, -6.35), align=None)
        Polygon((32.004, -7.229882), (32.131, -7.009911), (31.75, -6.35), (31.623, -6.56997), align=None)
        Polygon((31.623, -6.56997), (31.75, -6.35), (31.496, -6.35), align=None)
        Polygon((31.115, -7.449852), (31.623, -6.56997), (31.496, -6.35), (30.988, -7.229882), align=None)
        Polygon((30.988, -7.229882), (31.496, -6.35), (30.48, -6.35), align=None)
        Polygon((29.845, -7.449852), (29.972, -7.229882), (29.464, -6.35), (29.21, -6.35), align=None)
        Polygon((-29.972, -7.229882), (-29.464, -6.35), (-30.48, -6.35), align=None)
        Polygon((-31.115, -7.449852), (-30.988, -7.229882), (-31.496, -6.35), (-31.623, -6.56997), align=None)
        Polygon((-31.623, -6.56997), (-31.496, -6.35), (-31.75, -6.35), align=None)
        Polygon((-32.004, -7.229882), (-31.623, -6.56997), (-31.75, -6.35), (-32.131, -7.009911), align=None)
        Polygon((-32.131, -7.009911), (-31.75, -6.35), (-32.512, -6.35), align=None)
        Polygon((-32.385, -7.449852), (-32.131, -7.009911), (-32.512, -6.35), (-32.766, -6.789941), align=None)
        Polygon((-32.766, -6.789941), (-32.512, -6.35), (-33.02, -6.35), align=None)
        Polygon((-33.02, -7.229882), (-32.766, -6.789941), (-33.02, -6.35), (-33.274, -6.789941), align=None)
        Polygon((-33.274, -6.789941), (-33.02, -6.35), (-33.528, -6.35), align=None)
        Polygon((-33.655, -7.449852), (-33.274, -6.789941), (-33.528, -6.35), (-33.909, -7.009911), align=None)
        Polygon((-33.909, -7.009911), (-33.528, -6.35), (-34.29, -6.35), align=None)
        Polygon((-34.036, -7.229882), (-33.909, -7.009911), (-34.29, -6.35), (-34.417, -6.56997), align=None)
        Polygon((-34.417, -6.56997), (-34.29, -6.35), (-34.544, -6.35), align=None)
        Polygon((-34.925, -7.449852), (-34.417, -6.56997), (-34.544, -6.35), (-35.052, -7.229882), align=None)
        Polygon((-35.052, -7.229882), (-34.544, -6.35), (-35.56, -6.35), align=None)
        Polygon((-36.195, -7.449852), (-36.068, -7.229882), (-36.576, -6.35), (-36.703, -6.56997), align=None)
        Polygon((-36.703, -6.56997), (-36.576, -6.35), (-36.83, -6.35), align=None)
        Polygon((-37.084, -7.229882), (-36.703, -6.56997), (-36.83, -6.35), (-37.592, -6.35), align=None)
    extrude(amount=F3_DEPTH, both=True, mode=Mode.SUBTRACT)

    # F4
    f4_edges = [f1.edges().sort_by_distance(p)[0] for p in [
        (12.7, 0, 12.7),
        (-12.7, 0, 12.7),
        (12.7, 0, -12.7),
        (-12.7, 0, -12.7),
    ]]
    fillet(f4_edges, radius=F4_R)

    # F5
    f5_edges = [f1.edges().sort_by_distance(p)[0] for p in [
        (0, -15.875, 12.7),
        (0, 15.875, 12.7),
        (0, -15.875, -12.7),
        (0, 15.875, -12.7),
    ]]
    fillet(f5_edges, radius=F5_R)


solid = f1.part
